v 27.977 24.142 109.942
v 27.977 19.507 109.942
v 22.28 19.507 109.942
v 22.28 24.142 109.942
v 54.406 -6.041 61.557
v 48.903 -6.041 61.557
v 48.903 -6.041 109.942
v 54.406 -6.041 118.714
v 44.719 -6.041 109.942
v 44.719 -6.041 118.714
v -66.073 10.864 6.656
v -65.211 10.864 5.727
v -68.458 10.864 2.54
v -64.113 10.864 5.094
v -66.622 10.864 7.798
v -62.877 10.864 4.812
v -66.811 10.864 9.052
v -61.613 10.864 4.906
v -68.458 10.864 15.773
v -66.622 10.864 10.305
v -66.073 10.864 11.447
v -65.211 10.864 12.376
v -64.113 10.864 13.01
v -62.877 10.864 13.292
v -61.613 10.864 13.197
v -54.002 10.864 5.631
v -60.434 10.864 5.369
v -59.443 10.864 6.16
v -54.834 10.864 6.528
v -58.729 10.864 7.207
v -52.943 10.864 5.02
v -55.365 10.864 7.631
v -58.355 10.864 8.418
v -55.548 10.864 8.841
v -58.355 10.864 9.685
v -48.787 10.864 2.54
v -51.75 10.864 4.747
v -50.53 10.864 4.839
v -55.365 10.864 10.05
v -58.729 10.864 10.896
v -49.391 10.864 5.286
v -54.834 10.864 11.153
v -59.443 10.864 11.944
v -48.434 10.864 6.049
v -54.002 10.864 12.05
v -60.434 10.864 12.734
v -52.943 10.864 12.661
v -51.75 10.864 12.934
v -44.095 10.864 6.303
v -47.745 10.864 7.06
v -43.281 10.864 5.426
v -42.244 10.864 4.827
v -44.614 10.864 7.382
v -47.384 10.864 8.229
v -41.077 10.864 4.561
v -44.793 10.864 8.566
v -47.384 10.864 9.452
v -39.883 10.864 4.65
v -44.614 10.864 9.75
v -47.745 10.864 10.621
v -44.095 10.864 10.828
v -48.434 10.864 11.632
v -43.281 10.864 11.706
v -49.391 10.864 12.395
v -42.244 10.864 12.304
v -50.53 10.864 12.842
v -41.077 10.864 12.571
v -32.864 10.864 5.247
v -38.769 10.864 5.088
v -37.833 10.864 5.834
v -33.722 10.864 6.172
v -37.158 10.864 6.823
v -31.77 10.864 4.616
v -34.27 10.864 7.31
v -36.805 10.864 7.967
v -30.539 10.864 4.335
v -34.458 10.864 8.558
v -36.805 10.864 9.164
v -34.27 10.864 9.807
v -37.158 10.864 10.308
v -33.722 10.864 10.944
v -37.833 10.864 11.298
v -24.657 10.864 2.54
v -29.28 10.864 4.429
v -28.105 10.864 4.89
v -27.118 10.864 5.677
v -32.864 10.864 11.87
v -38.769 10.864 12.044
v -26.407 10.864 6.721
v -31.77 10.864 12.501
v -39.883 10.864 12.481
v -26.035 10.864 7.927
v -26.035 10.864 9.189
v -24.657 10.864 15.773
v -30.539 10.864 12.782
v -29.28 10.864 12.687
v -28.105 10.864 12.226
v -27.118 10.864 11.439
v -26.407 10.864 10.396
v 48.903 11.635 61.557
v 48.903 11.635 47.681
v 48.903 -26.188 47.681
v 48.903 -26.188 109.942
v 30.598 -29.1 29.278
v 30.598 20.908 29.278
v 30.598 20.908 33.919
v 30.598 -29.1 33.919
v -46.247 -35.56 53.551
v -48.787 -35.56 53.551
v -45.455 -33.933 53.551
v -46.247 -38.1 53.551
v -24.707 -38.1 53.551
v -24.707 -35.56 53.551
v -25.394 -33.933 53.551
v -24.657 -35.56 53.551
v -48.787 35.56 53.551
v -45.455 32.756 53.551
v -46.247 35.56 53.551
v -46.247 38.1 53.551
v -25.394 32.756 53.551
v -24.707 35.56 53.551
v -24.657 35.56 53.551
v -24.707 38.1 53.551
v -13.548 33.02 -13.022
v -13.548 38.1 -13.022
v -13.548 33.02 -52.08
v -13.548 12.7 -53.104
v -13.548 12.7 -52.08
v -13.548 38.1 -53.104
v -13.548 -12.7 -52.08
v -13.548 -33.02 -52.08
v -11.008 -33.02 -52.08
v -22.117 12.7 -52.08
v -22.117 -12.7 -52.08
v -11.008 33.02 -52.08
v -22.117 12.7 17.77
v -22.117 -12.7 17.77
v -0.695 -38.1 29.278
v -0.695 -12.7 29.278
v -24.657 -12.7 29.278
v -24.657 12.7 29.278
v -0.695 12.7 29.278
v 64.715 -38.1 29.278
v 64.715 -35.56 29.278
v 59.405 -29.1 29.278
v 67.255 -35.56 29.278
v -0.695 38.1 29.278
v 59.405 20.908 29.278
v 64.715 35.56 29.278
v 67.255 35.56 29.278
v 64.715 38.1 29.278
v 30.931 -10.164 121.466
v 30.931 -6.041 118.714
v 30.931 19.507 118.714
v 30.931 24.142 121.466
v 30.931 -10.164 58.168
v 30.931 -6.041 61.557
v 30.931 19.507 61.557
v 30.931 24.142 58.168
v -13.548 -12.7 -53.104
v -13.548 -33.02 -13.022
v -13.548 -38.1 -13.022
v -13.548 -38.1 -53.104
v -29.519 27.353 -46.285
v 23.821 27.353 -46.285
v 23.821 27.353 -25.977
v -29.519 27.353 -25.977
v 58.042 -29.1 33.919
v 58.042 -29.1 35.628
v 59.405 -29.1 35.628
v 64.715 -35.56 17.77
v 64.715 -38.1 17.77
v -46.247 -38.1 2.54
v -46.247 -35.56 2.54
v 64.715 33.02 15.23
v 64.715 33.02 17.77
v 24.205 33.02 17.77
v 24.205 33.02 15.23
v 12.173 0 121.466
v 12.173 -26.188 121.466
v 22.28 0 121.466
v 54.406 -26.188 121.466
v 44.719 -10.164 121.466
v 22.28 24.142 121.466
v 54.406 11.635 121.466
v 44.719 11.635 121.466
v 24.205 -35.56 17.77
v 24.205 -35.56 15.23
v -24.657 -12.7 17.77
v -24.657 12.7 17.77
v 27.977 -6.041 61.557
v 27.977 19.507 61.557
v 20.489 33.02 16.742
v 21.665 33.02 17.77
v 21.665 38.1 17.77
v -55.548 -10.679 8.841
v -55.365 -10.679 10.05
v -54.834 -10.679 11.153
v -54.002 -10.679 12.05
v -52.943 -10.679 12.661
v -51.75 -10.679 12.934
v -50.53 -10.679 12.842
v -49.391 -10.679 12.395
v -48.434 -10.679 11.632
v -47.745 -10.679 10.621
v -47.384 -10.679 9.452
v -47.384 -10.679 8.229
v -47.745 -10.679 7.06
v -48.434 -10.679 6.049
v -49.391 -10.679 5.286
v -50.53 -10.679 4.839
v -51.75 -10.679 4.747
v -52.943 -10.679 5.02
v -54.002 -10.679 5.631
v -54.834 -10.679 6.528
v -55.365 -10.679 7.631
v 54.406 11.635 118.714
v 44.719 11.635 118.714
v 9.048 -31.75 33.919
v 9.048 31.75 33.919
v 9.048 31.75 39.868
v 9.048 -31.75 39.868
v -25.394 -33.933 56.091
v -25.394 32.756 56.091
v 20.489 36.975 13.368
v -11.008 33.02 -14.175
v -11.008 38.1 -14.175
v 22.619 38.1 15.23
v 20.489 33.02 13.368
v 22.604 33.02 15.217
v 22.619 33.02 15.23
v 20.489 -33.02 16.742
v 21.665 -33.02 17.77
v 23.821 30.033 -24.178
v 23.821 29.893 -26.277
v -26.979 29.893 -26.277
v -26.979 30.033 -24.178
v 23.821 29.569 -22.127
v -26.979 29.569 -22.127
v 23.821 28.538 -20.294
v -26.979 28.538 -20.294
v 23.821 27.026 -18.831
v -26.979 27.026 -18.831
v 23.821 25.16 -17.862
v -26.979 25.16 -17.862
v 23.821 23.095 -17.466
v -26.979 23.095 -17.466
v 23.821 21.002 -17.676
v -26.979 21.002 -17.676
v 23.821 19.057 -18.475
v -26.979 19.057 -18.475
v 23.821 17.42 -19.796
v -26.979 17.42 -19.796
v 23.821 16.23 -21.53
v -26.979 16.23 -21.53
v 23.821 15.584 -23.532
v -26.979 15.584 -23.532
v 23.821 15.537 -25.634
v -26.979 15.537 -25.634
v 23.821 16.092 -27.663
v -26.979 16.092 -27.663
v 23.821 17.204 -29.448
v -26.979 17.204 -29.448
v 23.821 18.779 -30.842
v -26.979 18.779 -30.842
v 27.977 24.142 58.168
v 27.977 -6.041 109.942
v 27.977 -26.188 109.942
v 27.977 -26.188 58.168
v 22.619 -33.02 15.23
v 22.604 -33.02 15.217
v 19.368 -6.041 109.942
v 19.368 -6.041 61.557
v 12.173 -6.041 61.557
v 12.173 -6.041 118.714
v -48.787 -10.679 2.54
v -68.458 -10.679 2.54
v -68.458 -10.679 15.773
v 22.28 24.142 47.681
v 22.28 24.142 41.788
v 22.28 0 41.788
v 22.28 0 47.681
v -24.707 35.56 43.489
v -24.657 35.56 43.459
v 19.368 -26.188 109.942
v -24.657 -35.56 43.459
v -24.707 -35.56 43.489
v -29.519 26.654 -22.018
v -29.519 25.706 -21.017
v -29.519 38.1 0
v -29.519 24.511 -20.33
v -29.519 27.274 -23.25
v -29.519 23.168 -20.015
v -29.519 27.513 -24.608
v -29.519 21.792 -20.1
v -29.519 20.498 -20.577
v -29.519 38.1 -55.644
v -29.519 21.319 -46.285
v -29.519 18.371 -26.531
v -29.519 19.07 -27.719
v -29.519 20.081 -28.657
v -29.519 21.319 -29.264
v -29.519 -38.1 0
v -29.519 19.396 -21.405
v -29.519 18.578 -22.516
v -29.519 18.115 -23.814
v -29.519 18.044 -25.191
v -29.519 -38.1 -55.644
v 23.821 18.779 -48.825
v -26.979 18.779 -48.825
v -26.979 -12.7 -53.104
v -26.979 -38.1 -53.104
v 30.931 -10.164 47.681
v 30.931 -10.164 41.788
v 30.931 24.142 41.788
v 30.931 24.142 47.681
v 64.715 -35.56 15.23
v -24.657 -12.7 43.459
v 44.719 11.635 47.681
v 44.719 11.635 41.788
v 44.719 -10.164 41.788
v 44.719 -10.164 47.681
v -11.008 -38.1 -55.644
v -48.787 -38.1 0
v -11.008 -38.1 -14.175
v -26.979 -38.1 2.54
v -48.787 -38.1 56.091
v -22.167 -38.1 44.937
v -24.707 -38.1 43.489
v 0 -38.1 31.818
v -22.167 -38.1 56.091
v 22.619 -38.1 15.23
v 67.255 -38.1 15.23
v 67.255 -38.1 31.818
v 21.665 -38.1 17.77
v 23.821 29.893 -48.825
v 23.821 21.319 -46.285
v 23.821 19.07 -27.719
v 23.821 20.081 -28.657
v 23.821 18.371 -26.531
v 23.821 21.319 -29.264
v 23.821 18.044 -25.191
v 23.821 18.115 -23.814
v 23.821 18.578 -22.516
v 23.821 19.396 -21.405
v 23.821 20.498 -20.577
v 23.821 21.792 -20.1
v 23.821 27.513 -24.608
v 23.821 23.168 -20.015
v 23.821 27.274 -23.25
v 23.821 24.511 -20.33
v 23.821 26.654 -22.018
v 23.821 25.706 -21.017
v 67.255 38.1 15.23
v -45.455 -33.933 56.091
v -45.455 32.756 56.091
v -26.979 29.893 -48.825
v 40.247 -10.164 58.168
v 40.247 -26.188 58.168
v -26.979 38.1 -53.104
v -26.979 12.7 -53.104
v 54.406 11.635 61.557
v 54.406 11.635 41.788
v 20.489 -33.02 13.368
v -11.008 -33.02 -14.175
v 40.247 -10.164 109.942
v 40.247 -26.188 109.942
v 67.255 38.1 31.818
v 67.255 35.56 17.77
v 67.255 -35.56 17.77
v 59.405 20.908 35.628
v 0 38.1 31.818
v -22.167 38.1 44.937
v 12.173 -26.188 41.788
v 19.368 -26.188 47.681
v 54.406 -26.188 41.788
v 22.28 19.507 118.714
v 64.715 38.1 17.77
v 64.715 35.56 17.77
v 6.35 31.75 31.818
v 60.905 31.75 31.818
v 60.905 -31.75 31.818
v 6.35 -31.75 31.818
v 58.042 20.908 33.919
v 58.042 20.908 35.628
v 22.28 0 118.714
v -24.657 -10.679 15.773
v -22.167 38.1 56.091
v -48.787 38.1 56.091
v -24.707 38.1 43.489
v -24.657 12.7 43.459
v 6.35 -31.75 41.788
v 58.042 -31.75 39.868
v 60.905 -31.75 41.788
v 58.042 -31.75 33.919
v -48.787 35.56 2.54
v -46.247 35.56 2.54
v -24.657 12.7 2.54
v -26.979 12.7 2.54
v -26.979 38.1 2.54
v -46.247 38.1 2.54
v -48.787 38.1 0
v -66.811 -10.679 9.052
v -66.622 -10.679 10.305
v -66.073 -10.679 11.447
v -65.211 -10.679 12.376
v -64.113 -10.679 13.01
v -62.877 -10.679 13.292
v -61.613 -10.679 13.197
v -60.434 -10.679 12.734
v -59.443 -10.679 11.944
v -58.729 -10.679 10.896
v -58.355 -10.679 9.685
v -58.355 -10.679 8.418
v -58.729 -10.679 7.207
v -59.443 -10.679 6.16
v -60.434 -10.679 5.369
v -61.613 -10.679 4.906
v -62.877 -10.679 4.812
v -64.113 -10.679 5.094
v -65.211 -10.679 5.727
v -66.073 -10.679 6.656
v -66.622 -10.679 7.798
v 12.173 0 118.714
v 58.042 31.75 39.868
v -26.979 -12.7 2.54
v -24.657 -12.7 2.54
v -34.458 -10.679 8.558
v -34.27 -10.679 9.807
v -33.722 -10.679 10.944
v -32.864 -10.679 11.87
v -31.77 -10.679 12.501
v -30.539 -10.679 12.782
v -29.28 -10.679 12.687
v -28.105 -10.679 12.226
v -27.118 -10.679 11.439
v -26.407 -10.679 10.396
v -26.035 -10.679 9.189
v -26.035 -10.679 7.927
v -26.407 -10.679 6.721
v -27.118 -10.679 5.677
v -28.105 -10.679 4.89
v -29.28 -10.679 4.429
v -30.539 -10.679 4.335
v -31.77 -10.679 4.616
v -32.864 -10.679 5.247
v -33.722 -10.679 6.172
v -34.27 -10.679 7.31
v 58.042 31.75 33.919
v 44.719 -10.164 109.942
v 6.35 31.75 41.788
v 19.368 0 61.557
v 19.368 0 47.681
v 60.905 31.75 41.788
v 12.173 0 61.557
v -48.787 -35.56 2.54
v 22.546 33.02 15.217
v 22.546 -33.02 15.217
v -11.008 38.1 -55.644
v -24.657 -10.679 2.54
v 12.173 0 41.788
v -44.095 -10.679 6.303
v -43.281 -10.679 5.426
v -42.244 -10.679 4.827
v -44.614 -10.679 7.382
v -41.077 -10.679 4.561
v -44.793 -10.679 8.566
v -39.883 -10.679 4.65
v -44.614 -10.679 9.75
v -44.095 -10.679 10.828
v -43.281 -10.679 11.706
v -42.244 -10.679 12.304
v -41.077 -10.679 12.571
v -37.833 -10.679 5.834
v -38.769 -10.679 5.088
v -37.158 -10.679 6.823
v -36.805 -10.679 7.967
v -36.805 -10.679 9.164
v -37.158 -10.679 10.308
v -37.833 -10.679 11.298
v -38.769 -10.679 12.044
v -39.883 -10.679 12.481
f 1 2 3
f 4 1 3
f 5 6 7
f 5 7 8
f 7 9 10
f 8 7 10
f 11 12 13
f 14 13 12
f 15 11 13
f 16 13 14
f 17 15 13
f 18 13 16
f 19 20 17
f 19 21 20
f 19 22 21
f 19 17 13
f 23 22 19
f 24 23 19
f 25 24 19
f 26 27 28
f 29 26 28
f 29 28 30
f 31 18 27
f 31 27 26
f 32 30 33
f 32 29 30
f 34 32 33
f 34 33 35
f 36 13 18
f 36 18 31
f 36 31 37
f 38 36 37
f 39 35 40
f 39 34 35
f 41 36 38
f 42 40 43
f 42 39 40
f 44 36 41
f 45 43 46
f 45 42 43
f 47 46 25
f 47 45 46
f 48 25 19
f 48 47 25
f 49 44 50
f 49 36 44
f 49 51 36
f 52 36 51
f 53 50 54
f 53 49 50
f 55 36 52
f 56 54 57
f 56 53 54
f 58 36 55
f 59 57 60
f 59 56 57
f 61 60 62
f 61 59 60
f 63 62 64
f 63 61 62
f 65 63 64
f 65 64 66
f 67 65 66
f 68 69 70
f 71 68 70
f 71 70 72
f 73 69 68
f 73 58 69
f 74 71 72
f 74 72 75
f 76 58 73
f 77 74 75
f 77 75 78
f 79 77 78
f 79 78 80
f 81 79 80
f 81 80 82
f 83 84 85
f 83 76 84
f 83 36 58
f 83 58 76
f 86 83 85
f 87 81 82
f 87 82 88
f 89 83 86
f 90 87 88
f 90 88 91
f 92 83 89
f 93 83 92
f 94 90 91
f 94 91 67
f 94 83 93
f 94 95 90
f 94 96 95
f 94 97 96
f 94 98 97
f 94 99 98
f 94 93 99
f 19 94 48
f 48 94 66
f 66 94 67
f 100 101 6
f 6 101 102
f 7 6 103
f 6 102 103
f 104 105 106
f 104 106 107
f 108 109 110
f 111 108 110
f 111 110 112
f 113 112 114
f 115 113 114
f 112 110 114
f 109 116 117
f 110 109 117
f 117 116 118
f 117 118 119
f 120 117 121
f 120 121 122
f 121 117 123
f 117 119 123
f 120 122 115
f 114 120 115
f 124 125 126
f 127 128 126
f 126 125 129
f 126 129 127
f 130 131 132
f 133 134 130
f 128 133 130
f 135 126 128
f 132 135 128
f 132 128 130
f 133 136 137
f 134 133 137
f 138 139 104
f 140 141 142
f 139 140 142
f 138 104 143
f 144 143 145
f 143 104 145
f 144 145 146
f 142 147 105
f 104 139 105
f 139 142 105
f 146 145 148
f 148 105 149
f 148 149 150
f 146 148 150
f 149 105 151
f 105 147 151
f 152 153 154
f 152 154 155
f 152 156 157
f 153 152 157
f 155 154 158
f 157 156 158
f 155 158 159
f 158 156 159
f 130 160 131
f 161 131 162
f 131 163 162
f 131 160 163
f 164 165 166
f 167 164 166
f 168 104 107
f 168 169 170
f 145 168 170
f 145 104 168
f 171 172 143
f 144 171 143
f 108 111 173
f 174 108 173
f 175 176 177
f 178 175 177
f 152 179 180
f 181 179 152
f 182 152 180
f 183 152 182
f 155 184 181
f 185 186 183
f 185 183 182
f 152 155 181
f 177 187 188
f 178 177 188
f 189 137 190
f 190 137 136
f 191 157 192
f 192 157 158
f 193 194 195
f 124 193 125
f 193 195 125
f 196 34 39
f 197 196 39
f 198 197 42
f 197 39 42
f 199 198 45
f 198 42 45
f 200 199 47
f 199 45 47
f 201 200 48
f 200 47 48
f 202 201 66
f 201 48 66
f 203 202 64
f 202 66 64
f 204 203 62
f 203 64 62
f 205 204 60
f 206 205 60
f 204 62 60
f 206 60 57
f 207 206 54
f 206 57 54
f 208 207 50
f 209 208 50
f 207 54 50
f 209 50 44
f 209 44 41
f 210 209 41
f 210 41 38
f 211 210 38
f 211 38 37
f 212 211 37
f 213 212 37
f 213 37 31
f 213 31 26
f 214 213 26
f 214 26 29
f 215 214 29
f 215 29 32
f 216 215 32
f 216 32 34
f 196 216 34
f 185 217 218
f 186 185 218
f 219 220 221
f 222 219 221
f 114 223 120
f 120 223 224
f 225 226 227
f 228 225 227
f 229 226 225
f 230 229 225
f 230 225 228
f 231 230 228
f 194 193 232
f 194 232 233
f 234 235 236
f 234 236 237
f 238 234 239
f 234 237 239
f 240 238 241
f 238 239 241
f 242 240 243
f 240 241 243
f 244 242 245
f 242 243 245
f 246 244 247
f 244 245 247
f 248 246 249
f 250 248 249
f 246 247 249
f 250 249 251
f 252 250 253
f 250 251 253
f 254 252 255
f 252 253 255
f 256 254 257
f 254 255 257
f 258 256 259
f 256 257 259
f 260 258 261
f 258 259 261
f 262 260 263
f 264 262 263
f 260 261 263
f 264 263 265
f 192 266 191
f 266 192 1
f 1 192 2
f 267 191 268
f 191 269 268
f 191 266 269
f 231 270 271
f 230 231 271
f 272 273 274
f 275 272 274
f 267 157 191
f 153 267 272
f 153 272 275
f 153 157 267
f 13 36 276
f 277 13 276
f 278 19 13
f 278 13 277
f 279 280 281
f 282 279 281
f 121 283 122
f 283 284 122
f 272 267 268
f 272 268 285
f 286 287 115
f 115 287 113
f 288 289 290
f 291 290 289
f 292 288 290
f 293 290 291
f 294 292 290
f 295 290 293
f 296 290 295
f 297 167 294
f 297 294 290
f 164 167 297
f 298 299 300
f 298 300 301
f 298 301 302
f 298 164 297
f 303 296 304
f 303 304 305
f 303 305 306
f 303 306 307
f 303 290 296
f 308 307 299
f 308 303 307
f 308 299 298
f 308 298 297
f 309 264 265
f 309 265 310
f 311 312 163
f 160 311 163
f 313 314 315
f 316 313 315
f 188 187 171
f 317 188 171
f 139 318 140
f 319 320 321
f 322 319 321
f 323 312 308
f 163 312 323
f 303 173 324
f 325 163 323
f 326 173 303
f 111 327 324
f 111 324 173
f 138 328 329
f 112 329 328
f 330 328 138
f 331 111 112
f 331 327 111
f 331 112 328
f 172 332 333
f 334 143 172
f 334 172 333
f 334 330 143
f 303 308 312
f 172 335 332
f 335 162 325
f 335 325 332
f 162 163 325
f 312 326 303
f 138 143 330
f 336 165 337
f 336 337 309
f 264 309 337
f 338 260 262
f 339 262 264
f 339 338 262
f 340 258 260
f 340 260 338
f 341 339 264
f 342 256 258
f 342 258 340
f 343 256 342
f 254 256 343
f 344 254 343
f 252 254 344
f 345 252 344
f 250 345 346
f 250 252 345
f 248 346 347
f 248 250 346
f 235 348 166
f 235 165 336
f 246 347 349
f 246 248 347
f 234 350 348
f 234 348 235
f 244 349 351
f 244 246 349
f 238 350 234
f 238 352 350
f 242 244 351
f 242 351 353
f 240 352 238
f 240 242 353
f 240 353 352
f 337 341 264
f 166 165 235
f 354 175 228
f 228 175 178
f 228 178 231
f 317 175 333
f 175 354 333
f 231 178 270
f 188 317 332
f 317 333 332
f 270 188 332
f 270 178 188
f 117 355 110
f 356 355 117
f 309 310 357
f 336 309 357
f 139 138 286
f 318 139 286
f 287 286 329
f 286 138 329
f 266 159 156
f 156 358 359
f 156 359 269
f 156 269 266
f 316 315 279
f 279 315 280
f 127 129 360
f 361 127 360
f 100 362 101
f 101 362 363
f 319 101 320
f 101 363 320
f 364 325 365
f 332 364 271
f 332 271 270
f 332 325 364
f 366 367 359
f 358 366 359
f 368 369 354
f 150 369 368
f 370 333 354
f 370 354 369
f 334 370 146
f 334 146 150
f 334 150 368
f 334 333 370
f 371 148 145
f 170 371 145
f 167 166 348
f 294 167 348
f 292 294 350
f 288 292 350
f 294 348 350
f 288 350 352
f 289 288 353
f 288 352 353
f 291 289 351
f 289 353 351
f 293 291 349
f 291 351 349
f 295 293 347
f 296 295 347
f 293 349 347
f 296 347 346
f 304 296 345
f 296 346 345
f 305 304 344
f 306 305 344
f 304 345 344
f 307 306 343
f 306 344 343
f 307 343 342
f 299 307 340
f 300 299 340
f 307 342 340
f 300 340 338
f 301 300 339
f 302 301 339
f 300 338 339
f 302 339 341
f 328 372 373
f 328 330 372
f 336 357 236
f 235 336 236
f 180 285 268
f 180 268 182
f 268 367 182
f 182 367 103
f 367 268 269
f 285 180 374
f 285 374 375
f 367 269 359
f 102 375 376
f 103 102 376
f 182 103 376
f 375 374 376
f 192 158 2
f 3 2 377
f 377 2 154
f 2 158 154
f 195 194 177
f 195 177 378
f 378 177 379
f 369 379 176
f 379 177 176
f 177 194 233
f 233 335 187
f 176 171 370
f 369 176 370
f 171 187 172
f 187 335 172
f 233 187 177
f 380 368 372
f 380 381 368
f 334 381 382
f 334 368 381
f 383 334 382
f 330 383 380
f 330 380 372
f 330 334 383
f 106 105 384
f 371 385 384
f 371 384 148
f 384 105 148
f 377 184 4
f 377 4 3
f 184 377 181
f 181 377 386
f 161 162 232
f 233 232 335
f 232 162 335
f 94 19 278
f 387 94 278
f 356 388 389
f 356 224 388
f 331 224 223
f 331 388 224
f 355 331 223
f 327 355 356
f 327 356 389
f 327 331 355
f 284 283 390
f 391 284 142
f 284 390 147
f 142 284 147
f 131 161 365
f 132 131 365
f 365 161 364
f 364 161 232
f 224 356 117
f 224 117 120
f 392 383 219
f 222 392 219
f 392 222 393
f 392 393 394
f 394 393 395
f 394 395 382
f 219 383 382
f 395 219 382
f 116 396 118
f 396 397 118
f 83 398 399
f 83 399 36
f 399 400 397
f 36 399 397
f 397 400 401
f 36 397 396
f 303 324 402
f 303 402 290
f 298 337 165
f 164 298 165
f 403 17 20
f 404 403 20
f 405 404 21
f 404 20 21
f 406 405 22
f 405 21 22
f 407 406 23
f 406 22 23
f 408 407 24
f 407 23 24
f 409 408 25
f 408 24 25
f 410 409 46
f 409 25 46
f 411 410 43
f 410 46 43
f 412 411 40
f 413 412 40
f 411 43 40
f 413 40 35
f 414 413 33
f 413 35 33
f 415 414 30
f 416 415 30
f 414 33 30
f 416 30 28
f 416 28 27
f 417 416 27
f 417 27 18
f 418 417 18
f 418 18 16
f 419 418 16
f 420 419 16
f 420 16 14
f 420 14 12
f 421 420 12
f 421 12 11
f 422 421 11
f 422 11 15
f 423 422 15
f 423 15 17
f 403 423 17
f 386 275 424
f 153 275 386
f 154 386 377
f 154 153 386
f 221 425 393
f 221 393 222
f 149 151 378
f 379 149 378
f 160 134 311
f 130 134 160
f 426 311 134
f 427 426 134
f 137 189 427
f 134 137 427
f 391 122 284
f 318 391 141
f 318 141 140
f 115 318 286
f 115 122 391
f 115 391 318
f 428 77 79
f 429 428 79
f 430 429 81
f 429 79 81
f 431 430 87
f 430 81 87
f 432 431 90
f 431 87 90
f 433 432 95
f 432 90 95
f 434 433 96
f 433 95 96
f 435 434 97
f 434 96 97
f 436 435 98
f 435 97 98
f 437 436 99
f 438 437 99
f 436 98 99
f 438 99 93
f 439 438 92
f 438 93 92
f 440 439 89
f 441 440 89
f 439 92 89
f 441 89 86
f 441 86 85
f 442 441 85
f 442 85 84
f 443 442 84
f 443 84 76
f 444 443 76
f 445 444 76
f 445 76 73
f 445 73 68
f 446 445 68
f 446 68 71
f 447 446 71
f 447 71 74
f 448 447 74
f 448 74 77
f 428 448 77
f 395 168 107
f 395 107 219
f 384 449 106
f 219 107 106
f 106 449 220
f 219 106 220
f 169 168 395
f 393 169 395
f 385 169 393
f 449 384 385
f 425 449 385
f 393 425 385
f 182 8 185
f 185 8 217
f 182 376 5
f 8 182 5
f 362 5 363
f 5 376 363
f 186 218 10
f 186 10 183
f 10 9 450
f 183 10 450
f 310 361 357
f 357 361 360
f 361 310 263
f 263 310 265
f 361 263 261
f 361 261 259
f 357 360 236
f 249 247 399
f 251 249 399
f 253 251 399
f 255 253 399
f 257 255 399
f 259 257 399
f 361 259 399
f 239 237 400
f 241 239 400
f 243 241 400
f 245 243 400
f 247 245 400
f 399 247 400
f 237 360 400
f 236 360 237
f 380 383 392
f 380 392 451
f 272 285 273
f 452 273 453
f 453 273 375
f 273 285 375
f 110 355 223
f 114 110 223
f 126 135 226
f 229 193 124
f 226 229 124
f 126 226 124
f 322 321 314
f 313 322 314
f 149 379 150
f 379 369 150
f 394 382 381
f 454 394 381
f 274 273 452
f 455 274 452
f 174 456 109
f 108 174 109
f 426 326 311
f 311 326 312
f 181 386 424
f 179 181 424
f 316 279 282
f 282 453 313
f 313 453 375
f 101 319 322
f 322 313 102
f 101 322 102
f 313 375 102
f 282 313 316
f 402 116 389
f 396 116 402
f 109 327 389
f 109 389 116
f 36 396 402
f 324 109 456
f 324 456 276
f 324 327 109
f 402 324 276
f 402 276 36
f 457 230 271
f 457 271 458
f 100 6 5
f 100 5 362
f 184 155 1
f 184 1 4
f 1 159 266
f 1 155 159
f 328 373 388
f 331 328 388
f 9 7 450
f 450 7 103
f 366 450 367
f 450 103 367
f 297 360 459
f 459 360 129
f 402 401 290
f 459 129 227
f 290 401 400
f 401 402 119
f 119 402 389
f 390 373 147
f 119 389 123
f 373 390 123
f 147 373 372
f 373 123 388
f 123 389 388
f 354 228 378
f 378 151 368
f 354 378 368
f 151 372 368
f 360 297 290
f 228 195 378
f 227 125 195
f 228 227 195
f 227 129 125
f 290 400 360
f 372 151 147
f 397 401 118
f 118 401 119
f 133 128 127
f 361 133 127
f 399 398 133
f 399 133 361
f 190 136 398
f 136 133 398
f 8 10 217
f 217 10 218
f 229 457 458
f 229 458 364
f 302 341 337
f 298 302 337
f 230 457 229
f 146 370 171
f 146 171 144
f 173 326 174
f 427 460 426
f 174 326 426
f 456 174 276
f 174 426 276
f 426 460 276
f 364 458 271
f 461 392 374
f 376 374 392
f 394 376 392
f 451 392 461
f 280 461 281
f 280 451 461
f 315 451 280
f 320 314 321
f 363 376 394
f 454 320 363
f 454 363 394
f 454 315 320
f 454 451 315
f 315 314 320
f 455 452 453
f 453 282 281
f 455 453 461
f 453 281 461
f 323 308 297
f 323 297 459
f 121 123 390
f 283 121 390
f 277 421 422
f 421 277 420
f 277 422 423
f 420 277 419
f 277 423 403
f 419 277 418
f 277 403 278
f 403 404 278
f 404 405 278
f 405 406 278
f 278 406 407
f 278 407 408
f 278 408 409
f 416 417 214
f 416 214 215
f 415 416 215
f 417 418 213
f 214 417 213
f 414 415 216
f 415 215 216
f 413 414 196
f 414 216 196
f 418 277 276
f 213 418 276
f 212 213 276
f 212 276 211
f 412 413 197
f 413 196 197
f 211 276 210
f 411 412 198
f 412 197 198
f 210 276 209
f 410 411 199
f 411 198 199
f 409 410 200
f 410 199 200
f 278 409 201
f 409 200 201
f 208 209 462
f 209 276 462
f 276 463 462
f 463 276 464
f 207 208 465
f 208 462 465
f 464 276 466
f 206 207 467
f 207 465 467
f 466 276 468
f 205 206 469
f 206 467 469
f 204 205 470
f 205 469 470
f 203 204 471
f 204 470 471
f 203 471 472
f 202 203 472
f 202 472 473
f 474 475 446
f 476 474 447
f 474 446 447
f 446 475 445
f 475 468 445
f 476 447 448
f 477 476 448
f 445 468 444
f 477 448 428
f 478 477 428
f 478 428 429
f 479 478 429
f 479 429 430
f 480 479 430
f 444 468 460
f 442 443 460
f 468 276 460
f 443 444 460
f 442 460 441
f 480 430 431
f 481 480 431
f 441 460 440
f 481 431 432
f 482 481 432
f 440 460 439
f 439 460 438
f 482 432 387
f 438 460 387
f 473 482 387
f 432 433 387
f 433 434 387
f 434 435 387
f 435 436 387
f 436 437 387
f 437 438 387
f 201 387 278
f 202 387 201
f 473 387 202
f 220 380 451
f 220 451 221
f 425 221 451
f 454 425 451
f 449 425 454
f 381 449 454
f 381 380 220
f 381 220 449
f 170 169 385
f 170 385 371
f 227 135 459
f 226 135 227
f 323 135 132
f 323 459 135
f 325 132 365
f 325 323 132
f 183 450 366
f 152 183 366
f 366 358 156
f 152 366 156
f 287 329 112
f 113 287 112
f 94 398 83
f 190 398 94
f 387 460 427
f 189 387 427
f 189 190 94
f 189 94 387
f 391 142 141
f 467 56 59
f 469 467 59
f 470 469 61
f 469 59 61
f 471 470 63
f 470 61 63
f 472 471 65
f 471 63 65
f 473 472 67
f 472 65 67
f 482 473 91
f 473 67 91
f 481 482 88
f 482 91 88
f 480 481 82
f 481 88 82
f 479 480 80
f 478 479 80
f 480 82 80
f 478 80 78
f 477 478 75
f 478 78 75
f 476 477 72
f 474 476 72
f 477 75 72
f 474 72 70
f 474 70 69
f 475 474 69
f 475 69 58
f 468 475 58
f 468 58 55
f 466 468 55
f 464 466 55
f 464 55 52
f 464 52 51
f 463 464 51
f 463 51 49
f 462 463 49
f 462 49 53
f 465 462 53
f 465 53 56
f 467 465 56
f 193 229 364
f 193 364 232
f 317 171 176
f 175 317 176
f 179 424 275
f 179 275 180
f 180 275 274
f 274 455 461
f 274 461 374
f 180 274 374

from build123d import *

# Parameters (mm, degrees)
F1_DEPTH       = 38.1
F3_DEPTH       = 25.4
F4_W           = 71.12
F4_H           = 11.5075405073
F5_DEPTH       = 166.5568947792
F6_W           = 71.12
F6_H           = 51.0108690095
F7_DEPTH       = 24.13
F9_DEPTH       = 69.85
F11_DEPTH      = 25.4
F13_DEPTH      = 69.9950531125
F14_W          = 54.5549456358
F14_H          = 63.5
F15_DEPTH      = 9.9698379636
F17_DEPTH      = 79.6777680516
F19_DEPTH      = 169.2734211683
F20_W          = 25.5475714803
F20_H          = 57.1575462818
F21_DEPTH      = 79.7184870968
F21_DEPTH_BACK = 25.4
F22_W          = 28.8064163178
F22_H          = 50.0078629702
F23_DEPTH      = 6.35
F24_W          = 48.9942021668
F24_H          = 5.9489458799
F25_DEPTH      = 69.851
F26_W          = 20.0615301728
F26_H          = 66.6889064014
F27_DEPTH      = 25.4
F29_DEPTH      = 50.8
F31_DEPTH      = 86.3181352615
F32_W          = 21.5430464596
F32_H          = 13.2329052007
F33_DEPTH      = 43.8010953367
F34_R          = 4.2353424769
F34_R_2        = 4.016178265
F34_R_3        = 4.1045612078
F34_R_4        = 4.2518599003
F35_DEPTH      = 25.4


with BuildPart() as f1:
    # F0 (on Front) → F1 (new body, symmetric)
    with BuildSketch(Plane.XZ):
        Polygon((-22.1669822931, 56.0908690095), (-48.7866848707, 56.0908690095), (-48.7866848707, 0), (-29.5187681913, 0), (-29.5187681913, -55.6436777115), (-11.0080987215, -55.6436777115), (-11.0080987215, -14.1748189926), (22.619381547, 15.2303725481), (67.2549456358, 15.2303725481), (67.2549456358, 31.8179130554), (0, 31.8179130554), (-22.1669822931, 44.9371486902), align=None)
    extrude(amount=F1_DEPTH, both=True)

    # F2 (on face) → F3 (cut)
    with BuildSketch(Plane.XZ.offset(38.1)):
        Polygon((64.7149456358, 17.7703725481), (64.7149456358, 29.2779130554), (-0.6953087103, 29.2779130554), (-24.7069822931, 43.4889048609), (-24.7069822931, 53.5508690095), (-46.2466848707, 53.5508690095), (-46.2466848707, 2.54), (-26.9787681913, 2.54), (-26.9787681913, -53.1036777115), (-13.5480987215, -53.1036777115), (-13.5480987215, -13.0217612085), (21.665474667, 17.7703725481), align=None)
    extrude(amount=-F3_DEPTH, mode=Mode.SUBTRACT)

    # F4 (on face) → F5 (cut)
    with BuildSketch(Plane.YZ.offset(67.2549456358)):
        with Locations((0, 23.5241428018)):
            Rectangle(F4_W, F4_H)
    extrude(amount=-F5_DEPTH, mode=Mode.SUBTRACT)

    # F6 (on face) → F7 (cut)
    with BuildSketch(Plane(origin=(-48.7866848707, 0, 0), x_dir=(0, -1, 0), z_dir=(-1, 0, 0))):
        with Locations((0, 28.0454345047)):
            Rectangle(F6_W, F6_H)
    extrude(amount=-F7_DEPTH, mode=Mode.SUBTRACT)

    # F8 (on face) → F9 (cut)
    with BuildSketch(Plane.XY.offset(17.7703725481)):
        Polygon((-22.1166848707, -33.02), (24.205474667, -33.02), (24.205474667, -35.56), (64.7149456358, -35.56), (64.7149456358, 33.02), (-22.1166848707, 33.02), align=None)
    extrude(amount=-F9_DEPTH, mode=Mode.SUBTRACT)

    # F10 (on face) → F11 (cut)
    with BuildSketch(Plane(origin=(0, 38.1, 0), x_dir=(-1, 0, 0), z_dir=(0, 1, 0))):
        Polygon((-64.7149456358, 17.7703725481), (-21.665474667, 17.7703725481), (13.5480987215, -13.0217612085), (13.5480987215, -53.1036777115), (26.9787681913, -53.1036777115), (26.9787681913, 2.54), (46.2466848707, 2.54), (46.2466848707, 53.5508690095), (24.7069822931, 53.5508690095), (24.7069822931, 43.4889048609), (0.6953087103, 29.2779130554), (-64.7149456358, 29.2779130554), align=None)
    extrude(amount=-F11_DEPTH, mode=Mode.SUBTRACT)

    # F12 (on face) → F13 (join)
    with BuildSketch(Plane(origin=(0, -33.02, 0), x_dir=(-1, 0, 0), z_dir=(0, 1, 0))):
        Polygon((-21.665474667, 17.7703725481), (-24.205474667, 17.7703725481), (-24.205474667, 15.2303725481), (-22.619381547, 15.2303725481), (-22.6041972144, 15.2170947704), (-22.5458946079, 15.2166113257), (-20.4890360799, 13.3675146709), (-20.4890360799, 16.7416483703), align=None)
    extrude(amount=F13_DEPTH)

    # F14 (on face) → F15 (join)
    with BuildSketch(Plane.XY.offset(31.8179130554)):
        with Locations((33.6274728179, 0)):
            Rectangle(F14_W, F14_H)
    extrude(amount=F15_DEPTH)

    # F16 (on face) → F17 (join)
    with BuildSketch(Plane.XY.offset(41.787751019)):
        Polygon((12.1729150414, -26.1881239712), (54.4057376683, -26.1881239712), (54.4057376683, 11.6354003549), (44.7186082602, 11.6354003549), (44.7186082602, -10.164026171), (30.9308022261, -10.164026171), (30.9308022261, 24.1416729987), (22.2798474133, 24.1416729987), (22.2798474133, 0), (12.1729150414, 0), align=None)
    extrude(amount=F17_DEPTH)

    # F18 (on face) → F19 (cut)
    with BuildSketch(Plane.XZ.offset(26.1881239712)):
        Polygon((27.9768835753, 109.9416464567), (19.3683411926, 109.9416464567), (19.3683411926, 47.6811267436), (48.9032641053, 47.6811267436), (48.9032641053, 109.9416464567), (40.2469709516, 109.9416464567), (40.2469709516, 58.1681281328), (27.9768835753, 58.1681281328), align=None)
    extrude(amount=-F19_DEPTH, mode=Mode.SUBTRACT)

    # F20 (on face) → F21 (cut, two sides)
    with BuildSketch(Plane.YZ.offset(30.9308022261)) as f21_sk:
        with Locations((6.7332647741, 90.1354327798)):
            Rectangle(F20_W, F20_H)
    extrude(amount=-F21_DEPTH, mode=Mode.SUBTRACT)
    extrude(f21_sk.sketch, amount=F21_DEPTH_BACK, mode=Mode.SUBTRACT)

    # F22 (on face) → F23 (cut)
    with BuildSketch(Plane(origin=(0, 0, 29.2779130554), x_dir=(1, 0, 0), z_dir=(0, 0, -1))):
        with Locations((45.0015263632, 4.0960470214)):
            Rectangle(F22_W, F22_H)
    extrude(amount=-F23_DEPTH, mode=Mode.SUBTRACT)

    # F24 (on face) → F25 (cut, through all)
    with BuildSketch(Plane(origin=(0, 31.75, 0), x_dir=(-1, 0, 0), z_dir=(0, 1, 0))):
        with Locations((-33.5451457649, 36.8936993182)):
            Rectangle(F24_W, F24_H)
    extrude(amount=-F25_DEPTH, mode=Mode.SUBTRACT)

    # F26 (on face) → F27 (cut)
    with BuildSketch(Plane.XY.offset(56.0908690095)):
        with Locations((-35.4243777692, -0.5888808519)):
            Rectangle(F26_W, F26_H)
    extrude(amount=-F27_DEPTH, mode=Mode.SUBTRACT)

    # F28 (on face) → F29 (join)
    with BuildSketch(Plane.YZ.offset(-26.9787681913)):
        with BuildLine():
            Line((29.8926215619, -48.8248394649), (29.8926215619, -26.276535997))
            ThreePointArc((29.8926215619, -26.276535997), (20.0002810954, -18.0048741229), (18.7791224223, -30.8418348831))
            Line((18.7791224223, -30.8418348831), (18.7791224223, -48.8248394649))
            Line((18.7791224223, -48.8248394649), (29.8926215619, -48.8248394649))
        make_face()
    extrude(amount=F29_DEPTH)

    # F30 (on face) → F31 (cut)
    with BuildSketch(Plane.YZ.offset(23.8212318087)):
        with BuildLine():
            Line((21.3191224223, -46.2848394649), (27.3526215619, -46.2848394649))
            Line((27.3526215619, -46.2848394649), (27.3526215619, -25.9773227743))
            ThreePointArc((27.3526215619, -25.9773227743), (20.4981967379, -20.5767900682), (21.3191224223, -29.2644234743))
            Line((21.3191224223, -29.2644234743), (21.3191224223, -46.2848394649))
        make_face()
    extrude(amount=-F31_DEPTH, mode=Mode.SUBTRACT)

    # F32 (on face) → F33 (join)
    with BuildSketch(Plane(origin=(-24.6566848707, 0, 0), x_dir=(0, -1, 0), z_dir=(-1, 0, 0))):
        with Locations((-0.0923750922, 9.1564526004)):
            Rectangle(F32_W, F32_H)
    extrude(amount=F33_DEPTH)

    # F34 (on face) → F35 (cut)
    with BuildSketch(Plane(origin=(0, 10.863898322, 0), x_dir=(-1, 0, 0), z_dir=(0, 1, 0))):
        with Locations((30.2229300141, 8.5582211614)):
            Circle(F34_R)
        with Locations((40.7767370343, 8.5658058524)):
            Circle(F34_R_2)
        with Locations((51.4430738986, 8.8405385613)):
            Circle(F34_R_3)
        with Locations((62.559530139, 9.0516358614)):
            Circle(F34_R_4)
    extrude(amount=-F35_DEPTH, mode=Mode.SUBTRACT)


solid = f1.part
